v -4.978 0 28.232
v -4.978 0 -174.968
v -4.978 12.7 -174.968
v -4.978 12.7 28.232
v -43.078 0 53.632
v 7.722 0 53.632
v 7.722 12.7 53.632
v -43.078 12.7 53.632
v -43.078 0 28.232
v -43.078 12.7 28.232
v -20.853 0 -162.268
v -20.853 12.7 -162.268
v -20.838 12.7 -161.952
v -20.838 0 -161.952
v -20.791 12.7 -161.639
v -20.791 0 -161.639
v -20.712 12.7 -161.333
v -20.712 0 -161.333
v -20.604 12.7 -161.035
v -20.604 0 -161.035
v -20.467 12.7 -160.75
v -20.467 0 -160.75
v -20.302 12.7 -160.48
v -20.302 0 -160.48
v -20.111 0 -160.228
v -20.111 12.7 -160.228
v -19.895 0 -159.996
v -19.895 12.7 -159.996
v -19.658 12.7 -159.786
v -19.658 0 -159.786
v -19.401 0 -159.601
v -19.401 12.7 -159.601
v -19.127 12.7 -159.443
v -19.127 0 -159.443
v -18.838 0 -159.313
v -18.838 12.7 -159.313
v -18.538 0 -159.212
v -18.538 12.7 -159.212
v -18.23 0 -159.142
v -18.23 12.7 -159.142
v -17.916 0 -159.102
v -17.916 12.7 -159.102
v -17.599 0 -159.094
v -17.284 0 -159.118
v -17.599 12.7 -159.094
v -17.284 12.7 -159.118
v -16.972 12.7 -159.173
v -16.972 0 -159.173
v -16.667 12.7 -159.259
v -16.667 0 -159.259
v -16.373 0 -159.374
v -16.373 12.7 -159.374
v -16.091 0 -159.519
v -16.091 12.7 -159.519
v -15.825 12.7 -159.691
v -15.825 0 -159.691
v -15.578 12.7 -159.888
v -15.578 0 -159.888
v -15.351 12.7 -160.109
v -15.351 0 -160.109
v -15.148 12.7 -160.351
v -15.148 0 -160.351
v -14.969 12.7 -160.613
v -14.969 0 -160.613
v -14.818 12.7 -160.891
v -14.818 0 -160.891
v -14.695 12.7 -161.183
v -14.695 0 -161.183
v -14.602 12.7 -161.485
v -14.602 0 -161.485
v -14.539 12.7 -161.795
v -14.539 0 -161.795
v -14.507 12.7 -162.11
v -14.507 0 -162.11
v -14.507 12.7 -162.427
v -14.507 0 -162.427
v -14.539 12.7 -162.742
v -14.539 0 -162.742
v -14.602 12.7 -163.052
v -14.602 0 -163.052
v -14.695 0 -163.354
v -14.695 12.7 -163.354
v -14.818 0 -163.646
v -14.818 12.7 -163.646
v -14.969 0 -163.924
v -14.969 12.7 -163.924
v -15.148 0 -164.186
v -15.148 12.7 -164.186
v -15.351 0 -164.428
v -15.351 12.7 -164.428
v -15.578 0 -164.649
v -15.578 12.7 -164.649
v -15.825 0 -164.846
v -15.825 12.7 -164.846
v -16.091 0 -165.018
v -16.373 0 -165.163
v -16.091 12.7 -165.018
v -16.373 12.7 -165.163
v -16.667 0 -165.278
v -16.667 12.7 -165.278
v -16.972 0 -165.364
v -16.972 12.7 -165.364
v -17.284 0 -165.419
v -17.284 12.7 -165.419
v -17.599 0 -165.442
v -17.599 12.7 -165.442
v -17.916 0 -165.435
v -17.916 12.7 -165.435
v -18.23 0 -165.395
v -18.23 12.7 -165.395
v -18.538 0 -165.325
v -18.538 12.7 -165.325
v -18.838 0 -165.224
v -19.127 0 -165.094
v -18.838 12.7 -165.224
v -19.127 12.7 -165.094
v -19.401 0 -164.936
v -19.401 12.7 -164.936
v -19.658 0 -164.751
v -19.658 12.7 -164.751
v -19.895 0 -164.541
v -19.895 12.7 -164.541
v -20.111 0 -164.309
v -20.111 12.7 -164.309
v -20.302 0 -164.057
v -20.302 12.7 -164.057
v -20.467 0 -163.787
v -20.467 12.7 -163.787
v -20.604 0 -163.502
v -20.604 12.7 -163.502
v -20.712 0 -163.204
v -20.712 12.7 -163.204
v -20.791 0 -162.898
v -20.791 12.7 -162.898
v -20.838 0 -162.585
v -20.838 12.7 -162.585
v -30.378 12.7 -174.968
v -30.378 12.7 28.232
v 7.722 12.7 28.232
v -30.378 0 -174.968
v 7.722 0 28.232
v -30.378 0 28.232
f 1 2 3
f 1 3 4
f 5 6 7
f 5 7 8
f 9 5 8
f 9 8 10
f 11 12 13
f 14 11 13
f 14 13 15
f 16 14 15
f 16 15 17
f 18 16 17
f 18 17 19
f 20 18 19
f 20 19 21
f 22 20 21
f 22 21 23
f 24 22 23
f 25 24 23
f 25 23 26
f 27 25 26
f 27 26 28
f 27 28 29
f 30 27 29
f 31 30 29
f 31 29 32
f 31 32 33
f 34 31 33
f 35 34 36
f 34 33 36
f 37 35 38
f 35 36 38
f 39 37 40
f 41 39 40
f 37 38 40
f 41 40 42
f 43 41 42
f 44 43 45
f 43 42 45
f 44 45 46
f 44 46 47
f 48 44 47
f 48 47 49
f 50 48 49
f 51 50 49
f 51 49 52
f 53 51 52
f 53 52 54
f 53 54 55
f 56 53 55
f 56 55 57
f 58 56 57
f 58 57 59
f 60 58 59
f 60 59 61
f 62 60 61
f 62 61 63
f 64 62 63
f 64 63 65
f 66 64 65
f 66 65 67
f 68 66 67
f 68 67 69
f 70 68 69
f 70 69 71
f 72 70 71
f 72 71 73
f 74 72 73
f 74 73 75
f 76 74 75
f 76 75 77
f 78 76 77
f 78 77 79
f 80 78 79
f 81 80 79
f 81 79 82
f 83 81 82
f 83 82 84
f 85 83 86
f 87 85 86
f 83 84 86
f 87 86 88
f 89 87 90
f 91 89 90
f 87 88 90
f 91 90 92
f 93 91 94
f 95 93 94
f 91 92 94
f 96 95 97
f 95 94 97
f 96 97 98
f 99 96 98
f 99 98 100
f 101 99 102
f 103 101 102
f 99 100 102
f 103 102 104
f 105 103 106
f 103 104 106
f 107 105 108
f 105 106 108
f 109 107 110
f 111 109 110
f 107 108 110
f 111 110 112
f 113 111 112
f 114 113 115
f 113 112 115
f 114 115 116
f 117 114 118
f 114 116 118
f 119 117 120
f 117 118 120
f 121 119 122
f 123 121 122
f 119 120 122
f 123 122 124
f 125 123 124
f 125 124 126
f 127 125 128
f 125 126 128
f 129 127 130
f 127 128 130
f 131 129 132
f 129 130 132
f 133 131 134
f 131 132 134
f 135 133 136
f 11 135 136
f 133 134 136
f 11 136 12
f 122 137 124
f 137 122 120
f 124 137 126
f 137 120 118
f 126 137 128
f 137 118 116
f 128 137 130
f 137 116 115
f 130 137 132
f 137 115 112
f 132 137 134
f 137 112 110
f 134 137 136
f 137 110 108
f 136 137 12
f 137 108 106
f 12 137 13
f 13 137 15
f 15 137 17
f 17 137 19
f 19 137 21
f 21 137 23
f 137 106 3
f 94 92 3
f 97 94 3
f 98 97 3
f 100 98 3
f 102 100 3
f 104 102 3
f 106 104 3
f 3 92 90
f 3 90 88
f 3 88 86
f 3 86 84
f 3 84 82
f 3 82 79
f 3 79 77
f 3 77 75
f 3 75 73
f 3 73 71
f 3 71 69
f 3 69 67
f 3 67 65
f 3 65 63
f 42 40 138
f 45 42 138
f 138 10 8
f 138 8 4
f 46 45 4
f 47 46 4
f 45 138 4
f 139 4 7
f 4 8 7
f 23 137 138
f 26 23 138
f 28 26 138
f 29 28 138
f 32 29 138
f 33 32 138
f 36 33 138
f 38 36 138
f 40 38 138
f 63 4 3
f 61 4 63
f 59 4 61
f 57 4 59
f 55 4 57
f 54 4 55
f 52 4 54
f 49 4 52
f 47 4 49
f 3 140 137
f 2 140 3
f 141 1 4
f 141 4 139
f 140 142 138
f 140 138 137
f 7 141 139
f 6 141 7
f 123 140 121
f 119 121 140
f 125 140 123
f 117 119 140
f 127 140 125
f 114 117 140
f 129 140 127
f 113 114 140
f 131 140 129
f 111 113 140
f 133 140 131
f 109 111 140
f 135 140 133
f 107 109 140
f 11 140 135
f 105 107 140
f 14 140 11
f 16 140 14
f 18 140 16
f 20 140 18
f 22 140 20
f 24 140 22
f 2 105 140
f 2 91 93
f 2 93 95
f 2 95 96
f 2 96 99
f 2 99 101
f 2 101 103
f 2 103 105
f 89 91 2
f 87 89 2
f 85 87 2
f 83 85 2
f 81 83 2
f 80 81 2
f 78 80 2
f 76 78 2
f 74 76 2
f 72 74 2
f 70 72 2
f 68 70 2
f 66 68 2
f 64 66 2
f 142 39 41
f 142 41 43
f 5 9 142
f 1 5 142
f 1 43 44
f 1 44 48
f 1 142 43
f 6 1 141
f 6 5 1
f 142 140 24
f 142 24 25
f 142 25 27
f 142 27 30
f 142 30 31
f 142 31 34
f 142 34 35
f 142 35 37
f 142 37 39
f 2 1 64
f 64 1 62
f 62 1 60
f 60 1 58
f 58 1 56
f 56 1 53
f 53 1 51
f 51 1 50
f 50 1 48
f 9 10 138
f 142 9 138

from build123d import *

# Parameters (mm, degrees)
F1_DEPTH = 12.7
F3_D     = 6.35


with BuildPart() as f1:
    # F0 (on Front) → F1 (new body)
    with BuildSketch(Plane.XZ):
        Polygon((-30.378454, 28.231527), (-30.378454, -174.968473), (-4.978454, -174.968473), (-4.978454, 28.231527), (7.721546, 28.231527), (7.721546, 53.631527), (-43.078454, 53.631527), (-43.078454, 28.231527), align=None)
    extrude(amount=-F1_DEPTH)

    # F3 (through all)
    with Locations(Plane.XZ):
        with Locations((-17.678454, -162.268473)):
            Hole(F3_D / 2)


solid = f1.part
